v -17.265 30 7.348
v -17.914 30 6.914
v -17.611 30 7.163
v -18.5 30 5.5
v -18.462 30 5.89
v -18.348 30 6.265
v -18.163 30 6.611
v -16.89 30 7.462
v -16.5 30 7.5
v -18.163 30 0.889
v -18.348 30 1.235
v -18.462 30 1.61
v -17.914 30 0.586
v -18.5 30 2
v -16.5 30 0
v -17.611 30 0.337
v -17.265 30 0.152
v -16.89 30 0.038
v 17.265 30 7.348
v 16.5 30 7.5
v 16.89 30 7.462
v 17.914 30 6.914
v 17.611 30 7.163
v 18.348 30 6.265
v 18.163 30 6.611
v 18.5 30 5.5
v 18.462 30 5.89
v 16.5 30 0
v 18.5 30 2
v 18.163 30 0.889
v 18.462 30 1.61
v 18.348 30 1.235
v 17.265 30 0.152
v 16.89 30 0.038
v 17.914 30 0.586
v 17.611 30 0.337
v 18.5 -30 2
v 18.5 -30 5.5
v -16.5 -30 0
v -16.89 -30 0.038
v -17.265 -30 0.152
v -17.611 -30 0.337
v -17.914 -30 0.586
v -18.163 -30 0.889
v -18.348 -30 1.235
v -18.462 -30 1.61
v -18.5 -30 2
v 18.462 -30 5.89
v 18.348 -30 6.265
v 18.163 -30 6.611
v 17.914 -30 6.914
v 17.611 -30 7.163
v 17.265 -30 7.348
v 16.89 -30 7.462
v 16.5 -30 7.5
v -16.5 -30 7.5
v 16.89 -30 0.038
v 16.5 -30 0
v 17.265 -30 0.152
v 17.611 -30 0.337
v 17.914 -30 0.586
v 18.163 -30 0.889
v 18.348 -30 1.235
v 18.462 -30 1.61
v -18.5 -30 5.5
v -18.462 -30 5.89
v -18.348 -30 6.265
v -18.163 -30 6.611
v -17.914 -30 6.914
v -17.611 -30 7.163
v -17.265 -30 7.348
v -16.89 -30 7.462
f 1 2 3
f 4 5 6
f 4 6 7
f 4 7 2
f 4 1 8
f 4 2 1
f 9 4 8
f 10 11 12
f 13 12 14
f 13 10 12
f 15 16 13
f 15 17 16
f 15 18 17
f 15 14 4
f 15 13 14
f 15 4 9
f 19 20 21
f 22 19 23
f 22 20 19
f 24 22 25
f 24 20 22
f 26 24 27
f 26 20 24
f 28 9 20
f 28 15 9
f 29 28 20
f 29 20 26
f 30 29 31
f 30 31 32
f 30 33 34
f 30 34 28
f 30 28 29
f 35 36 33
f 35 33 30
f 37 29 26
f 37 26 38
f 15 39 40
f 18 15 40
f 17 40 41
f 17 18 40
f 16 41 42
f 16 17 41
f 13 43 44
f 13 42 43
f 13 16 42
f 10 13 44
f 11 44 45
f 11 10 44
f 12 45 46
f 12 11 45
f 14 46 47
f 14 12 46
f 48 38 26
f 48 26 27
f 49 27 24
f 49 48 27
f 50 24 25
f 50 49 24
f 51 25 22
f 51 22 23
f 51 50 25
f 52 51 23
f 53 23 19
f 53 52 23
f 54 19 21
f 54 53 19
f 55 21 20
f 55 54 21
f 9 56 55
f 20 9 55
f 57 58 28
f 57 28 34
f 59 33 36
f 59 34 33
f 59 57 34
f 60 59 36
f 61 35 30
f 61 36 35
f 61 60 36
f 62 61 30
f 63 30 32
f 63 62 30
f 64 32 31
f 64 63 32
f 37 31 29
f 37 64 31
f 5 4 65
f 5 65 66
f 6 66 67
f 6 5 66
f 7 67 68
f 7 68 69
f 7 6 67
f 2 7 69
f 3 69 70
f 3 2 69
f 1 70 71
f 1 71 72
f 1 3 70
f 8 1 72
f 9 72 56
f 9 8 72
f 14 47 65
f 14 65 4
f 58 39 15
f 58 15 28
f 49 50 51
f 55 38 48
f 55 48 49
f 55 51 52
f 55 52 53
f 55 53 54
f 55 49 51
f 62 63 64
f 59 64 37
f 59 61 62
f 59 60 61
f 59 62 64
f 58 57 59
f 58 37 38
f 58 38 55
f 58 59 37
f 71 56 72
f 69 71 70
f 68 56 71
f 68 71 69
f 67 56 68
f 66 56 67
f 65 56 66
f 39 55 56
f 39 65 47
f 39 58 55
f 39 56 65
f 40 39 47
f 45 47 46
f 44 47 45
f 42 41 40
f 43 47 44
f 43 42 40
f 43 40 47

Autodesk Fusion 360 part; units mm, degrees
sketch "Sketch1" plane through (0, 0, 0) normal (0, 0, 1) x (1, 0, 0)
  line L0 (18.5, -30) -> (-18.5, -30)
  line L1 (-18.5, -30) -> (-18.5, 30)
  line L2 (-18.5, 30) -> (18.5, 30)
  line L3 (18.5, 30) -> (18.5, -30)
  line L4 (18.5, -30) -> (-18.5, 30) construction
  line L5 (-18.5, -30) -> (18.5, 30) construction
  dimension "d1" = 60
  dimension "d2" = 37
extrude "Extrude1" add sketch "Sketch1" along normal blind 7.5
fillet "Fillet1" radius 2 4 edges at (18.5, 0, 7.5) (18.5, 0, 0) (-18.5, 0, 7.5) (-18.5, 0, 0)
